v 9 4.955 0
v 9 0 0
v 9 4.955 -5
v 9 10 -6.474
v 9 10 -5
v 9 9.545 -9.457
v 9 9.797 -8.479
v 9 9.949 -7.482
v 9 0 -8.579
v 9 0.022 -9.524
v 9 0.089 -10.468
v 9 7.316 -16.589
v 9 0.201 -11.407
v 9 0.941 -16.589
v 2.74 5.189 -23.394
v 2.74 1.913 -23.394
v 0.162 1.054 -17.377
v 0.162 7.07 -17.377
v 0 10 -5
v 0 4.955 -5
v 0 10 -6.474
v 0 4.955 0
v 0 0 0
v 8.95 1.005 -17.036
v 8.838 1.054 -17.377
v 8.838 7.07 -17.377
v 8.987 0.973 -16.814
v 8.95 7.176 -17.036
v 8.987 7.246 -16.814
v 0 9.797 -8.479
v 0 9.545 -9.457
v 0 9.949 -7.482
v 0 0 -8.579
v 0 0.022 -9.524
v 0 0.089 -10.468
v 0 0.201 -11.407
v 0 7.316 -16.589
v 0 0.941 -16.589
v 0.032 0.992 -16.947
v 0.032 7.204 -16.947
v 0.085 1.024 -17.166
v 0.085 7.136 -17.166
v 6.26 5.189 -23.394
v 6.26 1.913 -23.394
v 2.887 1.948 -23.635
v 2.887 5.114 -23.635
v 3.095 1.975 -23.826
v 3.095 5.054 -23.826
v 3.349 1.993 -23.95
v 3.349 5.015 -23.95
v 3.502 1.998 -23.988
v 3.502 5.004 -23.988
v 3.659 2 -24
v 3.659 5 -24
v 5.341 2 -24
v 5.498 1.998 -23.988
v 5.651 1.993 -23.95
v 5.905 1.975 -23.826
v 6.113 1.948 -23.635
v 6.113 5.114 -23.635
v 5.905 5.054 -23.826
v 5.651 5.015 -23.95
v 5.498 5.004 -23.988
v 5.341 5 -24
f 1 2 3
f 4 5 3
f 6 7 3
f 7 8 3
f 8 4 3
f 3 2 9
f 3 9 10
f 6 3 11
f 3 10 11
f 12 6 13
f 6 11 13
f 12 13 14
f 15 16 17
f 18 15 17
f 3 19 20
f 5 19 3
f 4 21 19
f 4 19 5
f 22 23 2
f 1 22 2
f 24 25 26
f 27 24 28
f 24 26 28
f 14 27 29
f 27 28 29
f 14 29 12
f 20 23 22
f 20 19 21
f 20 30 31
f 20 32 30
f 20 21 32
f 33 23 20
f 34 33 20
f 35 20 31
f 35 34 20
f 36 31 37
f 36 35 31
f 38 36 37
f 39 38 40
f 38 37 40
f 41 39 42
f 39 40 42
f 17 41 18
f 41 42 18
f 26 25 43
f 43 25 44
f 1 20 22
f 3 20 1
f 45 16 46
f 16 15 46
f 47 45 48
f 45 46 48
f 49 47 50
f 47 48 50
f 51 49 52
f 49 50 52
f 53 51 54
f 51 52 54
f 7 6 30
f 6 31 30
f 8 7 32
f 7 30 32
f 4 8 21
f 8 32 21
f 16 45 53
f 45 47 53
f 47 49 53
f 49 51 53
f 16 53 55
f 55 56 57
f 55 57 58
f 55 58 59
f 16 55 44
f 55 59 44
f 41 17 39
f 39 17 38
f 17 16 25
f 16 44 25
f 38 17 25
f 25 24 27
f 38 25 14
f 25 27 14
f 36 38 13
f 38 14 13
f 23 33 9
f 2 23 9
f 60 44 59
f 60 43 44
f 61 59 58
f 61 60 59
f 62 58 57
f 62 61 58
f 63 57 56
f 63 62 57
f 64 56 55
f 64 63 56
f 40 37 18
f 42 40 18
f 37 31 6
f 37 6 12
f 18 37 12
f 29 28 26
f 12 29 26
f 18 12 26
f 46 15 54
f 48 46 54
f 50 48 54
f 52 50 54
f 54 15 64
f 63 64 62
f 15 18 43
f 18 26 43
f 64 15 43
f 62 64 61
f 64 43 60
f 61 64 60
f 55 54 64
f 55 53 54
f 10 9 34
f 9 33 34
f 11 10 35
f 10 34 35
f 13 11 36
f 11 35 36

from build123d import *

# Parameters (mm, degrees)
SKETCH_1_W          = 9
SKETCH_1_H          = 24
EXTRUDE_1_DEPTH     = 10
SKETCH_2_W          = 9
SKETCH_2_H          = 5
CUT_EXTRUDE_1_DEPTH = 5.04505
CUT_EXTRUDE_2_DEPTH = 10
CUT_EXTRUDE_4_DEPTH = 11
FILLET_1_R          = 20
FILLET_2_R          = 1
FILLET_3_R          = 2
FILLET_4_R          = 10


with BuildPart() as part:
    # ｽｹｯﾁ1 → ﾎﾞｽ - 押し出し1 (new body)
    with BuildSketch(Plane(origin=(0, 0, 0), x_dir=(1, 0, 0), z_dir=(0, 1, 0))):
        with Locations((4.5, 12)):
            Rectangle(SKETCH_1_W, SKETCH_1_H)
    extrude(amount=EXTRUDE_1_DEPTH)

    # ｽｹｯﾁ2 → ｶｯﾄ - 押し出し1 (cut)
    with BuildSketch(Plane(origin=(0, 10, 0), x_dir=(1, 0, 0), z_dir=(0, 1, 0))):
        with Locations((4.5, 2.5)):
            Rectangle(SKETCH_2_W, SKETCH_2_H)
    extrude(amount=-CUT_EXTRUDE_1_DEPTH, mode=Mode.SUBTRACT)

    # ｽｹｯﾁ3 → ｶｯﾄ - 押し出し2 (cut, through all)
    with BuildSketch(Plane(origin=(9, 0, 0), x_dir=(0, 0, -1), z_dir=(1, 0, 0))):
        Polygon((8, 10), (24, 5), (24, 10), align=None)
        Polygon((10, 0), (24, 0), (24, 2), align=None)
    extrude(amount=-CUT_EXTRUDE_2_DEPTH, mode=Mode.SUBTRACT)

    # ｽｹｯﾁ6 → ｶｯﾄ - 押し出し4 (cut, through all)
    with BuildSketch(Plane.XZ):
        Polygon((9, -24), (9, -17), (6, -24), align=None)
        Polygon((3, -24), (0, -17), (0, -24), align=None)
    extrude(amount=-CUT_EXTRUDE_4_DEPTH, mode=Mode.SUBTRACT)

    # ﾌｨﾚｯﾄ1
    fillet_1_edges = [part.edges().sort_by_distance(p)[0] for p in [
        (4.5, 0, -10),
    ]]
    fillet(fillet_1_edges, radius=FILLET_1_R)

    # ﾌｨﾚｯﾄ2
    fillet_2_edges = [part.edges().sort_by_distance(p)[0] for p in [
        (6, 3.5, -24),
        (3, 3.5, -24),
    ]]
    fillet(fillet_2_edges, radius=FILLET_2_R)

    # ﾌｨﾚｯﾄ3
    fillet_3_edges = [part.edges().sort_by_distance(p)[0] for p in [
        (9, 4.09375, -17),
        (0, 4.09375, -17),
    ]]
    fillet(fillet_3_edges, radius=FILLET_3_R)

    # ﾌｨﾚｯﾄ4
    fillet_4_edges = [part.edges().sort_by_distance(p)[0] for p in [
        (4.5, 10, -8),
    ]]
    fillet(fillet_4_edges, radius=FILLET_4_R)


solid = part.part
